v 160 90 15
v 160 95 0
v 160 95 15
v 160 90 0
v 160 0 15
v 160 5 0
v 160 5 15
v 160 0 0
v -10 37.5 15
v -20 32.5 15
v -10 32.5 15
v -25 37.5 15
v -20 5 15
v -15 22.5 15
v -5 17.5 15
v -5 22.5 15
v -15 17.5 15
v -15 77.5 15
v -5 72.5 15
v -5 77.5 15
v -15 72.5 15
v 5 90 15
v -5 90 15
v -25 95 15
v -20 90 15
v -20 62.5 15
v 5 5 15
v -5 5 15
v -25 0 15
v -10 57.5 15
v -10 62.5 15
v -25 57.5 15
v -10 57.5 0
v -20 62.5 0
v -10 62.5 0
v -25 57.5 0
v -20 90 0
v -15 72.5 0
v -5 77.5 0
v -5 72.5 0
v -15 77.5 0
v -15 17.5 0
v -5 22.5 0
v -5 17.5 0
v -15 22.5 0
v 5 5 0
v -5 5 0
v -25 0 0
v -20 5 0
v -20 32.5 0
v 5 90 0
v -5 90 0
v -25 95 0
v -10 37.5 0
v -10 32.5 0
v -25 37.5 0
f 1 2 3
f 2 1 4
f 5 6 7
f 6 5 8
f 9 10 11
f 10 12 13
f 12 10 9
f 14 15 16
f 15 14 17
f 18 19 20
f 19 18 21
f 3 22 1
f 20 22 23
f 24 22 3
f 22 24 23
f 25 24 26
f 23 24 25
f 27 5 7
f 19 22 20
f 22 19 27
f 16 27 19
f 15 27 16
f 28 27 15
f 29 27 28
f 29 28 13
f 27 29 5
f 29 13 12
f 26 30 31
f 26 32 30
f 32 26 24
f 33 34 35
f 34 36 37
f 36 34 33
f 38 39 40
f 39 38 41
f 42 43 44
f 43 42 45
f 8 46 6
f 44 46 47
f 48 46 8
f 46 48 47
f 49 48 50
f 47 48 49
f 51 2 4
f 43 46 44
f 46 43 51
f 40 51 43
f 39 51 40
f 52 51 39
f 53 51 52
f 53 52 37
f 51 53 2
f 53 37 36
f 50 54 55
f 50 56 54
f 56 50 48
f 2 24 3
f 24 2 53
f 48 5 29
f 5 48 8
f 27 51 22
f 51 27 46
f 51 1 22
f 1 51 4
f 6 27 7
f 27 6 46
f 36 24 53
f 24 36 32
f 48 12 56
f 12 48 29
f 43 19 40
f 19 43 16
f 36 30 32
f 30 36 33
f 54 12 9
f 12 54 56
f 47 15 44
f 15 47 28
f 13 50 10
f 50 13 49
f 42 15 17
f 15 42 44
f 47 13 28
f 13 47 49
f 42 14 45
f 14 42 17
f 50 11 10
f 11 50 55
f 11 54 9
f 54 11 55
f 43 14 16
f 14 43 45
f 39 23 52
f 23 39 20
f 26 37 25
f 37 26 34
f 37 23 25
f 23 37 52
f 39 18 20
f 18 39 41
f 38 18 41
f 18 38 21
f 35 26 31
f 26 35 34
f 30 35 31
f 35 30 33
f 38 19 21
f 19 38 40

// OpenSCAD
$fn=200;

balconyHolder();
chainOfLightHolder();
    


module balconyHolder()
{
    difference()
    {
        cube([160,95,15]);
        translate([5,5,-1]) cube([160,85,17]);
    }
}

module chainOfLightHolder()
{
    difference()
    {
        translate([-25,0,0]) cube([25,95,15]);
        // translate([-20,5,-1]) cube([15,85,17]);
        translate([-26,37.5,-1]) cube([21,20,17]);
        
        translate([-20,5,-1]) cube([15,12.5,17]);
        translate([-20,15,-1]) cube([5,17.5,17]);
        translate([-10,22.5,-1]) cube([5,17.5,17]);
        translate([-20,22.5,-1]) cube([15,10,17]);
        
        translate([-20,77.5,-1]) cube([15,12.5,17]);
        translate([-20,62.5,-1]) cube([5,17.5,17]);
        translate([-10,55,-1]) cube([5,17.5,17]);
        translate([-20,62.5,-1]) cube([15,10,17]);
    }
    
}
